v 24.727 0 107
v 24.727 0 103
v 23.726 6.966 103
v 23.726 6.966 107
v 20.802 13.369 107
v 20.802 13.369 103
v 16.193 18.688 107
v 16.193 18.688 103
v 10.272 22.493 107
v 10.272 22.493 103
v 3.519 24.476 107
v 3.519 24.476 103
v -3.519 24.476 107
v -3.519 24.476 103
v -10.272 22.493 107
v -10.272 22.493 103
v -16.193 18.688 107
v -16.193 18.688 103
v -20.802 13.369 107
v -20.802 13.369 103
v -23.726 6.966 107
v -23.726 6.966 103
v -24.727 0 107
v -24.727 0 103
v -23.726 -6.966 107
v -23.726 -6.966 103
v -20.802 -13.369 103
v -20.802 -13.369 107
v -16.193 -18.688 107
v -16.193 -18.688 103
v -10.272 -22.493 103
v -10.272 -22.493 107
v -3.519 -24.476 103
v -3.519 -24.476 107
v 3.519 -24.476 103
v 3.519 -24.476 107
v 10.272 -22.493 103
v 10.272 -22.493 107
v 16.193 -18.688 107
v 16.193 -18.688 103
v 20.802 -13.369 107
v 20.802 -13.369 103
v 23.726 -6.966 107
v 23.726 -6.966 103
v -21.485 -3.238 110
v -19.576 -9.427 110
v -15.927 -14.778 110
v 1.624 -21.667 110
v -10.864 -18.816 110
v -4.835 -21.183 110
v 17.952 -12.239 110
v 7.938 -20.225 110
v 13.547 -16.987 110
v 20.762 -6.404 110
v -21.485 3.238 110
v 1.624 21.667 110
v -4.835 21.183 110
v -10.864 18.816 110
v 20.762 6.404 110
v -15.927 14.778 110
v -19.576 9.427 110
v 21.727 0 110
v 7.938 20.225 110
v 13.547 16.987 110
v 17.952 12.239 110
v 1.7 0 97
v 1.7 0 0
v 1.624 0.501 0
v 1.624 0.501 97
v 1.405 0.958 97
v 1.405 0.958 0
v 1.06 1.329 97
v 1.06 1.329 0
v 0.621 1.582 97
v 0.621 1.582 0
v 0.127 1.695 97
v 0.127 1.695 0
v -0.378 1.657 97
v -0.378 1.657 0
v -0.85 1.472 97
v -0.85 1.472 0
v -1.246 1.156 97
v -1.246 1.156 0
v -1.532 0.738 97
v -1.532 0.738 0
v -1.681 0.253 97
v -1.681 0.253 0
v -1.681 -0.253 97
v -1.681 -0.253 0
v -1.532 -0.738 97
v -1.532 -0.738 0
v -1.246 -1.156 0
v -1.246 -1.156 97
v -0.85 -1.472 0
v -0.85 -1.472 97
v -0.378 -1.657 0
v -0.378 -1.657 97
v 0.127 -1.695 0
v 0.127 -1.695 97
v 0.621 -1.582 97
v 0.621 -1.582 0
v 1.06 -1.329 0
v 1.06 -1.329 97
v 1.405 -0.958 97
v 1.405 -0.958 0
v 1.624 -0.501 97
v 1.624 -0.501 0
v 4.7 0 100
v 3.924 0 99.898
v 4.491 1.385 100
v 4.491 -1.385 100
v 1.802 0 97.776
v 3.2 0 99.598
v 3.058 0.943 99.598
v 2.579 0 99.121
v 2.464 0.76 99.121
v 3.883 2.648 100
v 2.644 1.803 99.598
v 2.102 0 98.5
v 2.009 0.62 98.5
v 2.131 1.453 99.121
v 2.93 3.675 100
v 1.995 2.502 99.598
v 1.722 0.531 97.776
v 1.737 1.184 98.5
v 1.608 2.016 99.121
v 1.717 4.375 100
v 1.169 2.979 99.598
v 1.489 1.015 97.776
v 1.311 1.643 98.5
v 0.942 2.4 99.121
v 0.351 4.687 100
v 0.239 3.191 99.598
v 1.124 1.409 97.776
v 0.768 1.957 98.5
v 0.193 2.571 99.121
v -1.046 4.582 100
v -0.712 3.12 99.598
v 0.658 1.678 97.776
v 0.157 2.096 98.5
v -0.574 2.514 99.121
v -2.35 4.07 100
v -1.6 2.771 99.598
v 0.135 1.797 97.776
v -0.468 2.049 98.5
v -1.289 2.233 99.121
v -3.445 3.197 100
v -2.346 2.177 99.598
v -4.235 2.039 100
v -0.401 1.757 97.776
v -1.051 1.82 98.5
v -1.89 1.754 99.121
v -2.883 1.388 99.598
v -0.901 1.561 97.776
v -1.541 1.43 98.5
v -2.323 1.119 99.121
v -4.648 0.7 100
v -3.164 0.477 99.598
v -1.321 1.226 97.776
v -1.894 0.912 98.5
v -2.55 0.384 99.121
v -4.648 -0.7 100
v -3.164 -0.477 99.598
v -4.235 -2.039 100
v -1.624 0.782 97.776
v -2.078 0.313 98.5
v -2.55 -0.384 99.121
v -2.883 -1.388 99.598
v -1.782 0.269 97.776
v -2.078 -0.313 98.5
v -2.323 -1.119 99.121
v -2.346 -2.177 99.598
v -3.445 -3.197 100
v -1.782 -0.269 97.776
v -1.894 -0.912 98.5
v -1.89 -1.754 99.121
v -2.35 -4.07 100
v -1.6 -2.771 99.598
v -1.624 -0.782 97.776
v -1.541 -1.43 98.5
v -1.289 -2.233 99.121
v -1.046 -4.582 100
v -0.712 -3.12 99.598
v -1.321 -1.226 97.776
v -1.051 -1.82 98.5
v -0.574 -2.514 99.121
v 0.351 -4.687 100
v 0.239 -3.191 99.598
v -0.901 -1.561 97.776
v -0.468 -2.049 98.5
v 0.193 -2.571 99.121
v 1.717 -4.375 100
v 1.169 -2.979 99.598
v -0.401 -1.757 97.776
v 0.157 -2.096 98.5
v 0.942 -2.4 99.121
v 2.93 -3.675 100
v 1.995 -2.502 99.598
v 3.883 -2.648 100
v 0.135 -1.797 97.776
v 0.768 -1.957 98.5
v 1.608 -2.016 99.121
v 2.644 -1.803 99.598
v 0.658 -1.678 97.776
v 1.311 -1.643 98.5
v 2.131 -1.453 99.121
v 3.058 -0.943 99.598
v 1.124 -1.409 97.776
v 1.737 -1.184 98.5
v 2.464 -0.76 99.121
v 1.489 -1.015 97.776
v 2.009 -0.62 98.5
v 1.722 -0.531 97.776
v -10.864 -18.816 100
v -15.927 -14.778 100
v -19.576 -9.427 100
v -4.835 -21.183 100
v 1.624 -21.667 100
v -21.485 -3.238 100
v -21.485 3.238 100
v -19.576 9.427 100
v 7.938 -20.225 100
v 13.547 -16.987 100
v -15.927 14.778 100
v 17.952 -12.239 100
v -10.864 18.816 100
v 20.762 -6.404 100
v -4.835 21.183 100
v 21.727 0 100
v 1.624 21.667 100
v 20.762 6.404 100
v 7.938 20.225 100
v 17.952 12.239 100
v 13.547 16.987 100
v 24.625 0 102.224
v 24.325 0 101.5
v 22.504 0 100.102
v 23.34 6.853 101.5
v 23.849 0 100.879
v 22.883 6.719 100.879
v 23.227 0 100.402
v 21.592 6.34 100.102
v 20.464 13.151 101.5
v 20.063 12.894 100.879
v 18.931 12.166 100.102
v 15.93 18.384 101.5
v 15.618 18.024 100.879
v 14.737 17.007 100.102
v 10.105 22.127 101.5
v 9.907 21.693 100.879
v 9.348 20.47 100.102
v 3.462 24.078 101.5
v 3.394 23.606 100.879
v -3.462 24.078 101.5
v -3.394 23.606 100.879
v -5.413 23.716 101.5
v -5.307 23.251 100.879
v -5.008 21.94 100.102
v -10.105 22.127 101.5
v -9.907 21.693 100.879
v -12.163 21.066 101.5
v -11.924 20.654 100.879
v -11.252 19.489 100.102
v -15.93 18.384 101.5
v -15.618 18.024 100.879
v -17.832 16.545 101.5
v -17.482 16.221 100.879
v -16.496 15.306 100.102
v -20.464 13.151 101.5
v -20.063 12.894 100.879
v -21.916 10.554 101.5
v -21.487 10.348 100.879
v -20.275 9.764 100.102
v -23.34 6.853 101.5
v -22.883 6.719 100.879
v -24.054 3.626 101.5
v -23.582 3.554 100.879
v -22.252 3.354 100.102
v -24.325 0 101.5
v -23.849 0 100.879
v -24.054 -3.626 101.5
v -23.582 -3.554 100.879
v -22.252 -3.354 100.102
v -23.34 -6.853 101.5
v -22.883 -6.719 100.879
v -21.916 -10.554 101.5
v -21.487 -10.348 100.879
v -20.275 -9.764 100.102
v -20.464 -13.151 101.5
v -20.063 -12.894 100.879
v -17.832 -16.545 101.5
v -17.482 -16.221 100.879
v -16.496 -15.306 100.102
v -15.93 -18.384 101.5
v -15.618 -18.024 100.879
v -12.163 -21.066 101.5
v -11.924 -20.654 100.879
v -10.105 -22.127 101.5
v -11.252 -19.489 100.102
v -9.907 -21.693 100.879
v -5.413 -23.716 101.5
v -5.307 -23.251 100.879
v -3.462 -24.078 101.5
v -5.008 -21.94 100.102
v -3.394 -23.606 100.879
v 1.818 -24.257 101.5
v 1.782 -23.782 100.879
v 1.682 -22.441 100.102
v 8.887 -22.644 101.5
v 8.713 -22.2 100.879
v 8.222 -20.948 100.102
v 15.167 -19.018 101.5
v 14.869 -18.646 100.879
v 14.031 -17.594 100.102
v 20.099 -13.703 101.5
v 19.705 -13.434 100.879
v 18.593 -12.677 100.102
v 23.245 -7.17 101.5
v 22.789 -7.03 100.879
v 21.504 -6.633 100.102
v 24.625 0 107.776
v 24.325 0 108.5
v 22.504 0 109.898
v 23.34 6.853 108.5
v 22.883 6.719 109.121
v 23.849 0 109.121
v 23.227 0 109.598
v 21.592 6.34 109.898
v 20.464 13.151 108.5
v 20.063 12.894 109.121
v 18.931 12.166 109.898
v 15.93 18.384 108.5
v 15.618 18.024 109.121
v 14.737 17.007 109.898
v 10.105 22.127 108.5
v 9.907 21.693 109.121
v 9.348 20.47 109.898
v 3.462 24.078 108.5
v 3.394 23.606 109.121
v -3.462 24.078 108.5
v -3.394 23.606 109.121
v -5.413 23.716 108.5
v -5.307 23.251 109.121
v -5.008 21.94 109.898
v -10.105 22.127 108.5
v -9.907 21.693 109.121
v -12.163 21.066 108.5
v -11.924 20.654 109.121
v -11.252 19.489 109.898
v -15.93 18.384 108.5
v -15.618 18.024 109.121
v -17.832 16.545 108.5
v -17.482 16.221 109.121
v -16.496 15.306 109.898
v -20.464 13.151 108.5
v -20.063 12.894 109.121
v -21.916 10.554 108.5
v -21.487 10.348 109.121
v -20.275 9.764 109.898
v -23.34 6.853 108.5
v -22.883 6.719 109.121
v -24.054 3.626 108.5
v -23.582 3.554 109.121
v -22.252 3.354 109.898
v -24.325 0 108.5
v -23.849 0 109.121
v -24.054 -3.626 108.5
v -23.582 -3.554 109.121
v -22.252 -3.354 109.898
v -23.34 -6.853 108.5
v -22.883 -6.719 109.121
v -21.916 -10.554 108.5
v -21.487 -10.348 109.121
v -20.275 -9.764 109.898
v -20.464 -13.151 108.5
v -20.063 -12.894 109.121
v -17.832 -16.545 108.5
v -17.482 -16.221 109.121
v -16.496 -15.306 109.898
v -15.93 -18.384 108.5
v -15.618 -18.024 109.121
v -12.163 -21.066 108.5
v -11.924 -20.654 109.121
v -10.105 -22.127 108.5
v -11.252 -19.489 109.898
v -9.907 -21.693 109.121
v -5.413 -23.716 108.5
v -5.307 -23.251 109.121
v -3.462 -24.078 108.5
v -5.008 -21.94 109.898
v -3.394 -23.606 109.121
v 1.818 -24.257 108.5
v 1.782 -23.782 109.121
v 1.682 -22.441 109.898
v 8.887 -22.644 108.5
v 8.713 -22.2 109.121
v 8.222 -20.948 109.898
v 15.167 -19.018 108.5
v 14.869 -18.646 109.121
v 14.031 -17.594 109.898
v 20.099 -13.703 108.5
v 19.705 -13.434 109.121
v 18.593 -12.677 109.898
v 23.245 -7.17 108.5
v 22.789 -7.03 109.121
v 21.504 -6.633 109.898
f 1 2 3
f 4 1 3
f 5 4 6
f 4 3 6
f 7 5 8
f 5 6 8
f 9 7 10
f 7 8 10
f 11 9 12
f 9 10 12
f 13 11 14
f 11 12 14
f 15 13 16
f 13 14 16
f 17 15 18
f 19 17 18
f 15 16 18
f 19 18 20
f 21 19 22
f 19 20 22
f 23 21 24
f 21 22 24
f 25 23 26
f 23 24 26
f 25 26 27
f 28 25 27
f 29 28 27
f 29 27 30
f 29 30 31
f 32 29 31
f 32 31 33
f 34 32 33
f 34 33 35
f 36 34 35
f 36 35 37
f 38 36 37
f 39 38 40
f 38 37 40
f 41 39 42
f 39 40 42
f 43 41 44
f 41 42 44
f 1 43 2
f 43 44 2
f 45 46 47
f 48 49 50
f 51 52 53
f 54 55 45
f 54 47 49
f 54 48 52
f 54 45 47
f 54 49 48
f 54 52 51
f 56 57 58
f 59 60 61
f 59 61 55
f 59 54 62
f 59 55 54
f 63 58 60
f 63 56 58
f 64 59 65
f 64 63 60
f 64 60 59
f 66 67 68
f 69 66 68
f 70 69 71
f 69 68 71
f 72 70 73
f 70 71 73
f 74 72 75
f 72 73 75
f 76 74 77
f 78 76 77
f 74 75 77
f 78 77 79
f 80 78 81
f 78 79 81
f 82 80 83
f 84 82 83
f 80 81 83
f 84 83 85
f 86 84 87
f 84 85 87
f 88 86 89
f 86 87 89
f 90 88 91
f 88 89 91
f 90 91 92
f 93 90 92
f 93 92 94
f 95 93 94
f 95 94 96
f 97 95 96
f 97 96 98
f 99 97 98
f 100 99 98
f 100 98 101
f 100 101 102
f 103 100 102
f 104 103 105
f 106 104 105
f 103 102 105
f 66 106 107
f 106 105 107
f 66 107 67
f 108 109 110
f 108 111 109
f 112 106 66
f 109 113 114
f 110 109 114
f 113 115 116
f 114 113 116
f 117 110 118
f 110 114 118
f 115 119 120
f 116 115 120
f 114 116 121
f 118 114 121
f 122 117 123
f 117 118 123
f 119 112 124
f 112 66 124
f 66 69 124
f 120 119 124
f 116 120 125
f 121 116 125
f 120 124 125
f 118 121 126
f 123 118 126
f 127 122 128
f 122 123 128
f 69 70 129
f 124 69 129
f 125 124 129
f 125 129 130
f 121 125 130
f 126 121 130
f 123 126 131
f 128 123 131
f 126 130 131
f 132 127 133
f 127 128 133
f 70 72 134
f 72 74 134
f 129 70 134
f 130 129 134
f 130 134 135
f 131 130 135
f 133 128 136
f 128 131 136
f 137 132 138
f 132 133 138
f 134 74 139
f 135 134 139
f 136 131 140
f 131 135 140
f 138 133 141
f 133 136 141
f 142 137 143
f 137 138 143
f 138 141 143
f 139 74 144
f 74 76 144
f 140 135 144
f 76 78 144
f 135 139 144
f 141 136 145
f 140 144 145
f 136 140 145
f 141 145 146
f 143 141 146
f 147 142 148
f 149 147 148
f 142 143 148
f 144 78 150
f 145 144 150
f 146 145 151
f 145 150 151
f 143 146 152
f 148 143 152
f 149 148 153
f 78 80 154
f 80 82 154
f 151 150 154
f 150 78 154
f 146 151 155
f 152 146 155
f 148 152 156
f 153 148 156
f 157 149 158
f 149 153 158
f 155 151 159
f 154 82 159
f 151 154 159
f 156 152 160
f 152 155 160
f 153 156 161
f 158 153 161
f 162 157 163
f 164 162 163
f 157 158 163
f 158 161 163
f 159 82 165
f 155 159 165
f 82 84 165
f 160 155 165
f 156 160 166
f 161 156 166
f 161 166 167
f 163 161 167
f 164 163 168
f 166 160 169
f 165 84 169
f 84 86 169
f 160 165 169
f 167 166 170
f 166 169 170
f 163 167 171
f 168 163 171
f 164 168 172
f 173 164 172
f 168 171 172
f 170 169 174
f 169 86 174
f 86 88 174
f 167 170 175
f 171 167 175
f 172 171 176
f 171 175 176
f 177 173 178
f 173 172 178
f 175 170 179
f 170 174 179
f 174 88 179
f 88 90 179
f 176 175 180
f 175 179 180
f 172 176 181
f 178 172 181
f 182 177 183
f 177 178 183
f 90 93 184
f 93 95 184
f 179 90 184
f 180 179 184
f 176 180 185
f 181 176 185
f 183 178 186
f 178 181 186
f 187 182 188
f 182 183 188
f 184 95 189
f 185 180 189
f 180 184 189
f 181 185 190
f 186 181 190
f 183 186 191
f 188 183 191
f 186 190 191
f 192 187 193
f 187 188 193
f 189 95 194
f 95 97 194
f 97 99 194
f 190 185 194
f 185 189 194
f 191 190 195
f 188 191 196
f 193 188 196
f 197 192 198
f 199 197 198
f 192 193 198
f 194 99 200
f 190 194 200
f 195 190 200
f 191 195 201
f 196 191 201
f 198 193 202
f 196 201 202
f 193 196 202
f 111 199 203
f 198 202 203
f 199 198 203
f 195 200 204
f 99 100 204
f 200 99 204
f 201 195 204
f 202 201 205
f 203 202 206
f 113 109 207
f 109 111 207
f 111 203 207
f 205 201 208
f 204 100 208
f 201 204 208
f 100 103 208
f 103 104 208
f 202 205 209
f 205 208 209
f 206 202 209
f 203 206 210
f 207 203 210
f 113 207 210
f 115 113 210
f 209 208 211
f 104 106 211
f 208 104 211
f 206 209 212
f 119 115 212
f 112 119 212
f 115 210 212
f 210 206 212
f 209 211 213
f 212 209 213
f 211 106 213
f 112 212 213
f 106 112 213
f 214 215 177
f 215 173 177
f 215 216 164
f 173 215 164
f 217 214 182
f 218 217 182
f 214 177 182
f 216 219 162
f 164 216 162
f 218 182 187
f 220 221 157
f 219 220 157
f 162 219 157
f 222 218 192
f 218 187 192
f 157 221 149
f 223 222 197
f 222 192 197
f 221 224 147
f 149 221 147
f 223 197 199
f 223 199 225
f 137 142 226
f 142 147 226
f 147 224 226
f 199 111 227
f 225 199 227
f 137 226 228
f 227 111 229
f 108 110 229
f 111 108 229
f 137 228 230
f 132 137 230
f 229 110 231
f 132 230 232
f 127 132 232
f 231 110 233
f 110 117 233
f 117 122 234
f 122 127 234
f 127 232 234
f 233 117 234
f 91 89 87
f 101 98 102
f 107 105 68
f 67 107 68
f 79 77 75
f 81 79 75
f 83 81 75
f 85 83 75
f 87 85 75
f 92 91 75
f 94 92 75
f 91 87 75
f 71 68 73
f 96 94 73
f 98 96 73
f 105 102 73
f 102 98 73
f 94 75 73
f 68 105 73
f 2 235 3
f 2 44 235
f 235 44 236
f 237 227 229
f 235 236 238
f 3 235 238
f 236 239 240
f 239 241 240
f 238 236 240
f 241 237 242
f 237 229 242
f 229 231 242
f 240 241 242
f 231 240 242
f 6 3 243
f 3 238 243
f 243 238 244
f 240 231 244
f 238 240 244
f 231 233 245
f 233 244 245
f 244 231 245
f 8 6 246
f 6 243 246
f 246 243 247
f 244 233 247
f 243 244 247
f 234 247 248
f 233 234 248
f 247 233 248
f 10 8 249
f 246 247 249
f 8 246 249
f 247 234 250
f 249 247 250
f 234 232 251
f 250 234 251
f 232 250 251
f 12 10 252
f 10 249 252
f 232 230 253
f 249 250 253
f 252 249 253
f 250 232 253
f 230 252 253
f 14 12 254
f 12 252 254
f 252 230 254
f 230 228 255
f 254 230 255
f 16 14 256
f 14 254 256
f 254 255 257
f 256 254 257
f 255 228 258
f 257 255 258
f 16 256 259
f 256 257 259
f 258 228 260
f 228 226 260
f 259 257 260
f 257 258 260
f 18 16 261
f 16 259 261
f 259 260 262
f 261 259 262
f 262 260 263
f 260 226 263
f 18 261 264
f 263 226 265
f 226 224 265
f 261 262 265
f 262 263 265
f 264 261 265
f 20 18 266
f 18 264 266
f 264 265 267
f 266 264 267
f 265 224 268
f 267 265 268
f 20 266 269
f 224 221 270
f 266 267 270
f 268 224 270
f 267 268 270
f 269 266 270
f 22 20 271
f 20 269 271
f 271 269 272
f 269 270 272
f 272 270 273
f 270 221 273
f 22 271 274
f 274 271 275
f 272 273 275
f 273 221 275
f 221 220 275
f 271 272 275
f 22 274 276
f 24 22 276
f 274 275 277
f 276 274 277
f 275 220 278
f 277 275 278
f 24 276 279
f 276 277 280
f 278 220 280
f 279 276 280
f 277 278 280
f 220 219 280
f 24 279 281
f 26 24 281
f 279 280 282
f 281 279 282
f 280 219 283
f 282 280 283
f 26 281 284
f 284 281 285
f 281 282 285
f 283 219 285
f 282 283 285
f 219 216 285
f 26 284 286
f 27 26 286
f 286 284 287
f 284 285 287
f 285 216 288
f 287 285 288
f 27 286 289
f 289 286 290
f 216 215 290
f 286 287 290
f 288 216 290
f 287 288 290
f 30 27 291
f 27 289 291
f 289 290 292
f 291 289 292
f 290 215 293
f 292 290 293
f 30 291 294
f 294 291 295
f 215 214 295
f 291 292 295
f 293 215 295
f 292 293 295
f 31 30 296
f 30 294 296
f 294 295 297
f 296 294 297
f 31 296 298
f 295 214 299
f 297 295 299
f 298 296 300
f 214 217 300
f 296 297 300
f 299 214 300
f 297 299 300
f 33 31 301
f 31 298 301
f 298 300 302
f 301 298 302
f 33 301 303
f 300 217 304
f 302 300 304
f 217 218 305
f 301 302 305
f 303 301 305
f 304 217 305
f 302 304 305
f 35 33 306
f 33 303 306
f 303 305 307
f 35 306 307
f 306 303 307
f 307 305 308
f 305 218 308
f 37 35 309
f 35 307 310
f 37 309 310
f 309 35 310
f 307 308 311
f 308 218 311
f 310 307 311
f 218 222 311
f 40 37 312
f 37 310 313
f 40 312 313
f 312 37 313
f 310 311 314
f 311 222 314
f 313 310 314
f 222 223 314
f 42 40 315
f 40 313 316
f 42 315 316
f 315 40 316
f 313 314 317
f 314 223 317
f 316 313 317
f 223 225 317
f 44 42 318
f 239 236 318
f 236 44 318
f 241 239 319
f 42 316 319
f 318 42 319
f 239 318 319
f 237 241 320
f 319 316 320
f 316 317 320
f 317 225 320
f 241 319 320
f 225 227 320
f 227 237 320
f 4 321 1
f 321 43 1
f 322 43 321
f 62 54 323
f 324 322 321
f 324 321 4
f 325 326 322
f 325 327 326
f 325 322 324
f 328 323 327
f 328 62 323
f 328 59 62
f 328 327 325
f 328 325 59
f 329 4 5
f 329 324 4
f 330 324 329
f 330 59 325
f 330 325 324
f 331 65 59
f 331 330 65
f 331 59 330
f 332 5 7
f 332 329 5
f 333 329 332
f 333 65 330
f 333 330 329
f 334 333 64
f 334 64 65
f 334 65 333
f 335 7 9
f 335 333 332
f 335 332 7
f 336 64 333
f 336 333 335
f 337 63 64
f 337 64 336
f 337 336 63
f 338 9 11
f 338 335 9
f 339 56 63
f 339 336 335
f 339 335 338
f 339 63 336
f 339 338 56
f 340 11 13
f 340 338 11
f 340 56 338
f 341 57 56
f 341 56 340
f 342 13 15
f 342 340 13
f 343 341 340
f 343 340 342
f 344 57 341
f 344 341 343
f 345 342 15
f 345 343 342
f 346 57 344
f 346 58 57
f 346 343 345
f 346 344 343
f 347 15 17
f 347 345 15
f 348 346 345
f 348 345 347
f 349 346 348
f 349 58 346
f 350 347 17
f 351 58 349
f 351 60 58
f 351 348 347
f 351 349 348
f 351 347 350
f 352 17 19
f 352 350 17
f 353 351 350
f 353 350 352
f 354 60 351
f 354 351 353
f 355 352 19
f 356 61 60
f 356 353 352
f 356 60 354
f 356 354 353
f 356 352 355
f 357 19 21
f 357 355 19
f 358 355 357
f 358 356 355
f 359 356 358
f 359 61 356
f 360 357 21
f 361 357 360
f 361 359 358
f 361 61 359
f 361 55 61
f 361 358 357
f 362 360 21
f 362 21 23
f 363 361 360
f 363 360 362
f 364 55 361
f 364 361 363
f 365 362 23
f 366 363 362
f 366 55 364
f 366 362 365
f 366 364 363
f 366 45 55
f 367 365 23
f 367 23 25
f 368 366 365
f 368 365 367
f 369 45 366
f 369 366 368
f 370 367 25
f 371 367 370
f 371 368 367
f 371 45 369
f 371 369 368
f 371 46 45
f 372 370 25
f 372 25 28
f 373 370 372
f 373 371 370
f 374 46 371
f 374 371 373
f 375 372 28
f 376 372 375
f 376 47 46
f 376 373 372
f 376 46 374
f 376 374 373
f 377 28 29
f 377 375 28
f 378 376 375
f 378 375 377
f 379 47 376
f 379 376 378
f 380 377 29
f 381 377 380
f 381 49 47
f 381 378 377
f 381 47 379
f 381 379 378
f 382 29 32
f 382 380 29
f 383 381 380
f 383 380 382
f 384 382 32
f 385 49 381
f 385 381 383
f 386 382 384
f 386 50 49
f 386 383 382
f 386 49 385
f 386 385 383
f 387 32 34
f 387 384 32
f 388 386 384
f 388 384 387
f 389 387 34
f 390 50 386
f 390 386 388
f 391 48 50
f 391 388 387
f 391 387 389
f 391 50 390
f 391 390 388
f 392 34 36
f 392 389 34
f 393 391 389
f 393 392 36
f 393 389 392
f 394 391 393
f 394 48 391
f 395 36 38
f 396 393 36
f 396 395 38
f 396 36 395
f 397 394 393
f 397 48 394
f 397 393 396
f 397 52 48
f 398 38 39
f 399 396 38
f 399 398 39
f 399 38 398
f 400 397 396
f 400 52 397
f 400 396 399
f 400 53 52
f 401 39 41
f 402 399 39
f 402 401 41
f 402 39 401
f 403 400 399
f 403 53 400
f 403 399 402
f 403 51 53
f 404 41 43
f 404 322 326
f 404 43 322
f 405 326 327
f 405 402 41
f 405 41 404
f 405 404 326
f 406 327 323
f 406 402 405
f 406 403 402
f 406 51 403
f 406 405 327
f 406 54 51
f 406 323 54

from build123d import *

# Parameters (mm, degrees)
SKETCH1_R           = 1.7
BOSS_EXTRUDE1_DEPTH = 100
SKETCH2_R           = 24.727322232
BOSS_EXTRUDE2_DEPTH = 10
FILLET2_R           = 3


with BuildPart() as part:
    # Sketch1 → Boss-Extrude1 (new body)
    with BuildSketch(Plane.XY):
        Circle(SKETCH1_R)
    extrude(amount=BOSS_EXTRUDE1_DEPTH)

    # Sketch2 → Boss-Extrude2 (add)
    with BuildSketch(Plane.XY.offset(100)):
        Circle(SKETCH2_R)
    extrude(amount=BOSS_EXTRUDE2_DEPTH)

    # Fillet2
    fillet2_edges = [part.edges().sort_by_distance(p)[0] for p in [
        (-1.7, 0, 100),
        (-24.727322232, 0, 100),
        (-24.727322232, 0, 110),
    ]]
    fillet(fillet2_edges, radius=FILLET2_R)


solid = part.part
